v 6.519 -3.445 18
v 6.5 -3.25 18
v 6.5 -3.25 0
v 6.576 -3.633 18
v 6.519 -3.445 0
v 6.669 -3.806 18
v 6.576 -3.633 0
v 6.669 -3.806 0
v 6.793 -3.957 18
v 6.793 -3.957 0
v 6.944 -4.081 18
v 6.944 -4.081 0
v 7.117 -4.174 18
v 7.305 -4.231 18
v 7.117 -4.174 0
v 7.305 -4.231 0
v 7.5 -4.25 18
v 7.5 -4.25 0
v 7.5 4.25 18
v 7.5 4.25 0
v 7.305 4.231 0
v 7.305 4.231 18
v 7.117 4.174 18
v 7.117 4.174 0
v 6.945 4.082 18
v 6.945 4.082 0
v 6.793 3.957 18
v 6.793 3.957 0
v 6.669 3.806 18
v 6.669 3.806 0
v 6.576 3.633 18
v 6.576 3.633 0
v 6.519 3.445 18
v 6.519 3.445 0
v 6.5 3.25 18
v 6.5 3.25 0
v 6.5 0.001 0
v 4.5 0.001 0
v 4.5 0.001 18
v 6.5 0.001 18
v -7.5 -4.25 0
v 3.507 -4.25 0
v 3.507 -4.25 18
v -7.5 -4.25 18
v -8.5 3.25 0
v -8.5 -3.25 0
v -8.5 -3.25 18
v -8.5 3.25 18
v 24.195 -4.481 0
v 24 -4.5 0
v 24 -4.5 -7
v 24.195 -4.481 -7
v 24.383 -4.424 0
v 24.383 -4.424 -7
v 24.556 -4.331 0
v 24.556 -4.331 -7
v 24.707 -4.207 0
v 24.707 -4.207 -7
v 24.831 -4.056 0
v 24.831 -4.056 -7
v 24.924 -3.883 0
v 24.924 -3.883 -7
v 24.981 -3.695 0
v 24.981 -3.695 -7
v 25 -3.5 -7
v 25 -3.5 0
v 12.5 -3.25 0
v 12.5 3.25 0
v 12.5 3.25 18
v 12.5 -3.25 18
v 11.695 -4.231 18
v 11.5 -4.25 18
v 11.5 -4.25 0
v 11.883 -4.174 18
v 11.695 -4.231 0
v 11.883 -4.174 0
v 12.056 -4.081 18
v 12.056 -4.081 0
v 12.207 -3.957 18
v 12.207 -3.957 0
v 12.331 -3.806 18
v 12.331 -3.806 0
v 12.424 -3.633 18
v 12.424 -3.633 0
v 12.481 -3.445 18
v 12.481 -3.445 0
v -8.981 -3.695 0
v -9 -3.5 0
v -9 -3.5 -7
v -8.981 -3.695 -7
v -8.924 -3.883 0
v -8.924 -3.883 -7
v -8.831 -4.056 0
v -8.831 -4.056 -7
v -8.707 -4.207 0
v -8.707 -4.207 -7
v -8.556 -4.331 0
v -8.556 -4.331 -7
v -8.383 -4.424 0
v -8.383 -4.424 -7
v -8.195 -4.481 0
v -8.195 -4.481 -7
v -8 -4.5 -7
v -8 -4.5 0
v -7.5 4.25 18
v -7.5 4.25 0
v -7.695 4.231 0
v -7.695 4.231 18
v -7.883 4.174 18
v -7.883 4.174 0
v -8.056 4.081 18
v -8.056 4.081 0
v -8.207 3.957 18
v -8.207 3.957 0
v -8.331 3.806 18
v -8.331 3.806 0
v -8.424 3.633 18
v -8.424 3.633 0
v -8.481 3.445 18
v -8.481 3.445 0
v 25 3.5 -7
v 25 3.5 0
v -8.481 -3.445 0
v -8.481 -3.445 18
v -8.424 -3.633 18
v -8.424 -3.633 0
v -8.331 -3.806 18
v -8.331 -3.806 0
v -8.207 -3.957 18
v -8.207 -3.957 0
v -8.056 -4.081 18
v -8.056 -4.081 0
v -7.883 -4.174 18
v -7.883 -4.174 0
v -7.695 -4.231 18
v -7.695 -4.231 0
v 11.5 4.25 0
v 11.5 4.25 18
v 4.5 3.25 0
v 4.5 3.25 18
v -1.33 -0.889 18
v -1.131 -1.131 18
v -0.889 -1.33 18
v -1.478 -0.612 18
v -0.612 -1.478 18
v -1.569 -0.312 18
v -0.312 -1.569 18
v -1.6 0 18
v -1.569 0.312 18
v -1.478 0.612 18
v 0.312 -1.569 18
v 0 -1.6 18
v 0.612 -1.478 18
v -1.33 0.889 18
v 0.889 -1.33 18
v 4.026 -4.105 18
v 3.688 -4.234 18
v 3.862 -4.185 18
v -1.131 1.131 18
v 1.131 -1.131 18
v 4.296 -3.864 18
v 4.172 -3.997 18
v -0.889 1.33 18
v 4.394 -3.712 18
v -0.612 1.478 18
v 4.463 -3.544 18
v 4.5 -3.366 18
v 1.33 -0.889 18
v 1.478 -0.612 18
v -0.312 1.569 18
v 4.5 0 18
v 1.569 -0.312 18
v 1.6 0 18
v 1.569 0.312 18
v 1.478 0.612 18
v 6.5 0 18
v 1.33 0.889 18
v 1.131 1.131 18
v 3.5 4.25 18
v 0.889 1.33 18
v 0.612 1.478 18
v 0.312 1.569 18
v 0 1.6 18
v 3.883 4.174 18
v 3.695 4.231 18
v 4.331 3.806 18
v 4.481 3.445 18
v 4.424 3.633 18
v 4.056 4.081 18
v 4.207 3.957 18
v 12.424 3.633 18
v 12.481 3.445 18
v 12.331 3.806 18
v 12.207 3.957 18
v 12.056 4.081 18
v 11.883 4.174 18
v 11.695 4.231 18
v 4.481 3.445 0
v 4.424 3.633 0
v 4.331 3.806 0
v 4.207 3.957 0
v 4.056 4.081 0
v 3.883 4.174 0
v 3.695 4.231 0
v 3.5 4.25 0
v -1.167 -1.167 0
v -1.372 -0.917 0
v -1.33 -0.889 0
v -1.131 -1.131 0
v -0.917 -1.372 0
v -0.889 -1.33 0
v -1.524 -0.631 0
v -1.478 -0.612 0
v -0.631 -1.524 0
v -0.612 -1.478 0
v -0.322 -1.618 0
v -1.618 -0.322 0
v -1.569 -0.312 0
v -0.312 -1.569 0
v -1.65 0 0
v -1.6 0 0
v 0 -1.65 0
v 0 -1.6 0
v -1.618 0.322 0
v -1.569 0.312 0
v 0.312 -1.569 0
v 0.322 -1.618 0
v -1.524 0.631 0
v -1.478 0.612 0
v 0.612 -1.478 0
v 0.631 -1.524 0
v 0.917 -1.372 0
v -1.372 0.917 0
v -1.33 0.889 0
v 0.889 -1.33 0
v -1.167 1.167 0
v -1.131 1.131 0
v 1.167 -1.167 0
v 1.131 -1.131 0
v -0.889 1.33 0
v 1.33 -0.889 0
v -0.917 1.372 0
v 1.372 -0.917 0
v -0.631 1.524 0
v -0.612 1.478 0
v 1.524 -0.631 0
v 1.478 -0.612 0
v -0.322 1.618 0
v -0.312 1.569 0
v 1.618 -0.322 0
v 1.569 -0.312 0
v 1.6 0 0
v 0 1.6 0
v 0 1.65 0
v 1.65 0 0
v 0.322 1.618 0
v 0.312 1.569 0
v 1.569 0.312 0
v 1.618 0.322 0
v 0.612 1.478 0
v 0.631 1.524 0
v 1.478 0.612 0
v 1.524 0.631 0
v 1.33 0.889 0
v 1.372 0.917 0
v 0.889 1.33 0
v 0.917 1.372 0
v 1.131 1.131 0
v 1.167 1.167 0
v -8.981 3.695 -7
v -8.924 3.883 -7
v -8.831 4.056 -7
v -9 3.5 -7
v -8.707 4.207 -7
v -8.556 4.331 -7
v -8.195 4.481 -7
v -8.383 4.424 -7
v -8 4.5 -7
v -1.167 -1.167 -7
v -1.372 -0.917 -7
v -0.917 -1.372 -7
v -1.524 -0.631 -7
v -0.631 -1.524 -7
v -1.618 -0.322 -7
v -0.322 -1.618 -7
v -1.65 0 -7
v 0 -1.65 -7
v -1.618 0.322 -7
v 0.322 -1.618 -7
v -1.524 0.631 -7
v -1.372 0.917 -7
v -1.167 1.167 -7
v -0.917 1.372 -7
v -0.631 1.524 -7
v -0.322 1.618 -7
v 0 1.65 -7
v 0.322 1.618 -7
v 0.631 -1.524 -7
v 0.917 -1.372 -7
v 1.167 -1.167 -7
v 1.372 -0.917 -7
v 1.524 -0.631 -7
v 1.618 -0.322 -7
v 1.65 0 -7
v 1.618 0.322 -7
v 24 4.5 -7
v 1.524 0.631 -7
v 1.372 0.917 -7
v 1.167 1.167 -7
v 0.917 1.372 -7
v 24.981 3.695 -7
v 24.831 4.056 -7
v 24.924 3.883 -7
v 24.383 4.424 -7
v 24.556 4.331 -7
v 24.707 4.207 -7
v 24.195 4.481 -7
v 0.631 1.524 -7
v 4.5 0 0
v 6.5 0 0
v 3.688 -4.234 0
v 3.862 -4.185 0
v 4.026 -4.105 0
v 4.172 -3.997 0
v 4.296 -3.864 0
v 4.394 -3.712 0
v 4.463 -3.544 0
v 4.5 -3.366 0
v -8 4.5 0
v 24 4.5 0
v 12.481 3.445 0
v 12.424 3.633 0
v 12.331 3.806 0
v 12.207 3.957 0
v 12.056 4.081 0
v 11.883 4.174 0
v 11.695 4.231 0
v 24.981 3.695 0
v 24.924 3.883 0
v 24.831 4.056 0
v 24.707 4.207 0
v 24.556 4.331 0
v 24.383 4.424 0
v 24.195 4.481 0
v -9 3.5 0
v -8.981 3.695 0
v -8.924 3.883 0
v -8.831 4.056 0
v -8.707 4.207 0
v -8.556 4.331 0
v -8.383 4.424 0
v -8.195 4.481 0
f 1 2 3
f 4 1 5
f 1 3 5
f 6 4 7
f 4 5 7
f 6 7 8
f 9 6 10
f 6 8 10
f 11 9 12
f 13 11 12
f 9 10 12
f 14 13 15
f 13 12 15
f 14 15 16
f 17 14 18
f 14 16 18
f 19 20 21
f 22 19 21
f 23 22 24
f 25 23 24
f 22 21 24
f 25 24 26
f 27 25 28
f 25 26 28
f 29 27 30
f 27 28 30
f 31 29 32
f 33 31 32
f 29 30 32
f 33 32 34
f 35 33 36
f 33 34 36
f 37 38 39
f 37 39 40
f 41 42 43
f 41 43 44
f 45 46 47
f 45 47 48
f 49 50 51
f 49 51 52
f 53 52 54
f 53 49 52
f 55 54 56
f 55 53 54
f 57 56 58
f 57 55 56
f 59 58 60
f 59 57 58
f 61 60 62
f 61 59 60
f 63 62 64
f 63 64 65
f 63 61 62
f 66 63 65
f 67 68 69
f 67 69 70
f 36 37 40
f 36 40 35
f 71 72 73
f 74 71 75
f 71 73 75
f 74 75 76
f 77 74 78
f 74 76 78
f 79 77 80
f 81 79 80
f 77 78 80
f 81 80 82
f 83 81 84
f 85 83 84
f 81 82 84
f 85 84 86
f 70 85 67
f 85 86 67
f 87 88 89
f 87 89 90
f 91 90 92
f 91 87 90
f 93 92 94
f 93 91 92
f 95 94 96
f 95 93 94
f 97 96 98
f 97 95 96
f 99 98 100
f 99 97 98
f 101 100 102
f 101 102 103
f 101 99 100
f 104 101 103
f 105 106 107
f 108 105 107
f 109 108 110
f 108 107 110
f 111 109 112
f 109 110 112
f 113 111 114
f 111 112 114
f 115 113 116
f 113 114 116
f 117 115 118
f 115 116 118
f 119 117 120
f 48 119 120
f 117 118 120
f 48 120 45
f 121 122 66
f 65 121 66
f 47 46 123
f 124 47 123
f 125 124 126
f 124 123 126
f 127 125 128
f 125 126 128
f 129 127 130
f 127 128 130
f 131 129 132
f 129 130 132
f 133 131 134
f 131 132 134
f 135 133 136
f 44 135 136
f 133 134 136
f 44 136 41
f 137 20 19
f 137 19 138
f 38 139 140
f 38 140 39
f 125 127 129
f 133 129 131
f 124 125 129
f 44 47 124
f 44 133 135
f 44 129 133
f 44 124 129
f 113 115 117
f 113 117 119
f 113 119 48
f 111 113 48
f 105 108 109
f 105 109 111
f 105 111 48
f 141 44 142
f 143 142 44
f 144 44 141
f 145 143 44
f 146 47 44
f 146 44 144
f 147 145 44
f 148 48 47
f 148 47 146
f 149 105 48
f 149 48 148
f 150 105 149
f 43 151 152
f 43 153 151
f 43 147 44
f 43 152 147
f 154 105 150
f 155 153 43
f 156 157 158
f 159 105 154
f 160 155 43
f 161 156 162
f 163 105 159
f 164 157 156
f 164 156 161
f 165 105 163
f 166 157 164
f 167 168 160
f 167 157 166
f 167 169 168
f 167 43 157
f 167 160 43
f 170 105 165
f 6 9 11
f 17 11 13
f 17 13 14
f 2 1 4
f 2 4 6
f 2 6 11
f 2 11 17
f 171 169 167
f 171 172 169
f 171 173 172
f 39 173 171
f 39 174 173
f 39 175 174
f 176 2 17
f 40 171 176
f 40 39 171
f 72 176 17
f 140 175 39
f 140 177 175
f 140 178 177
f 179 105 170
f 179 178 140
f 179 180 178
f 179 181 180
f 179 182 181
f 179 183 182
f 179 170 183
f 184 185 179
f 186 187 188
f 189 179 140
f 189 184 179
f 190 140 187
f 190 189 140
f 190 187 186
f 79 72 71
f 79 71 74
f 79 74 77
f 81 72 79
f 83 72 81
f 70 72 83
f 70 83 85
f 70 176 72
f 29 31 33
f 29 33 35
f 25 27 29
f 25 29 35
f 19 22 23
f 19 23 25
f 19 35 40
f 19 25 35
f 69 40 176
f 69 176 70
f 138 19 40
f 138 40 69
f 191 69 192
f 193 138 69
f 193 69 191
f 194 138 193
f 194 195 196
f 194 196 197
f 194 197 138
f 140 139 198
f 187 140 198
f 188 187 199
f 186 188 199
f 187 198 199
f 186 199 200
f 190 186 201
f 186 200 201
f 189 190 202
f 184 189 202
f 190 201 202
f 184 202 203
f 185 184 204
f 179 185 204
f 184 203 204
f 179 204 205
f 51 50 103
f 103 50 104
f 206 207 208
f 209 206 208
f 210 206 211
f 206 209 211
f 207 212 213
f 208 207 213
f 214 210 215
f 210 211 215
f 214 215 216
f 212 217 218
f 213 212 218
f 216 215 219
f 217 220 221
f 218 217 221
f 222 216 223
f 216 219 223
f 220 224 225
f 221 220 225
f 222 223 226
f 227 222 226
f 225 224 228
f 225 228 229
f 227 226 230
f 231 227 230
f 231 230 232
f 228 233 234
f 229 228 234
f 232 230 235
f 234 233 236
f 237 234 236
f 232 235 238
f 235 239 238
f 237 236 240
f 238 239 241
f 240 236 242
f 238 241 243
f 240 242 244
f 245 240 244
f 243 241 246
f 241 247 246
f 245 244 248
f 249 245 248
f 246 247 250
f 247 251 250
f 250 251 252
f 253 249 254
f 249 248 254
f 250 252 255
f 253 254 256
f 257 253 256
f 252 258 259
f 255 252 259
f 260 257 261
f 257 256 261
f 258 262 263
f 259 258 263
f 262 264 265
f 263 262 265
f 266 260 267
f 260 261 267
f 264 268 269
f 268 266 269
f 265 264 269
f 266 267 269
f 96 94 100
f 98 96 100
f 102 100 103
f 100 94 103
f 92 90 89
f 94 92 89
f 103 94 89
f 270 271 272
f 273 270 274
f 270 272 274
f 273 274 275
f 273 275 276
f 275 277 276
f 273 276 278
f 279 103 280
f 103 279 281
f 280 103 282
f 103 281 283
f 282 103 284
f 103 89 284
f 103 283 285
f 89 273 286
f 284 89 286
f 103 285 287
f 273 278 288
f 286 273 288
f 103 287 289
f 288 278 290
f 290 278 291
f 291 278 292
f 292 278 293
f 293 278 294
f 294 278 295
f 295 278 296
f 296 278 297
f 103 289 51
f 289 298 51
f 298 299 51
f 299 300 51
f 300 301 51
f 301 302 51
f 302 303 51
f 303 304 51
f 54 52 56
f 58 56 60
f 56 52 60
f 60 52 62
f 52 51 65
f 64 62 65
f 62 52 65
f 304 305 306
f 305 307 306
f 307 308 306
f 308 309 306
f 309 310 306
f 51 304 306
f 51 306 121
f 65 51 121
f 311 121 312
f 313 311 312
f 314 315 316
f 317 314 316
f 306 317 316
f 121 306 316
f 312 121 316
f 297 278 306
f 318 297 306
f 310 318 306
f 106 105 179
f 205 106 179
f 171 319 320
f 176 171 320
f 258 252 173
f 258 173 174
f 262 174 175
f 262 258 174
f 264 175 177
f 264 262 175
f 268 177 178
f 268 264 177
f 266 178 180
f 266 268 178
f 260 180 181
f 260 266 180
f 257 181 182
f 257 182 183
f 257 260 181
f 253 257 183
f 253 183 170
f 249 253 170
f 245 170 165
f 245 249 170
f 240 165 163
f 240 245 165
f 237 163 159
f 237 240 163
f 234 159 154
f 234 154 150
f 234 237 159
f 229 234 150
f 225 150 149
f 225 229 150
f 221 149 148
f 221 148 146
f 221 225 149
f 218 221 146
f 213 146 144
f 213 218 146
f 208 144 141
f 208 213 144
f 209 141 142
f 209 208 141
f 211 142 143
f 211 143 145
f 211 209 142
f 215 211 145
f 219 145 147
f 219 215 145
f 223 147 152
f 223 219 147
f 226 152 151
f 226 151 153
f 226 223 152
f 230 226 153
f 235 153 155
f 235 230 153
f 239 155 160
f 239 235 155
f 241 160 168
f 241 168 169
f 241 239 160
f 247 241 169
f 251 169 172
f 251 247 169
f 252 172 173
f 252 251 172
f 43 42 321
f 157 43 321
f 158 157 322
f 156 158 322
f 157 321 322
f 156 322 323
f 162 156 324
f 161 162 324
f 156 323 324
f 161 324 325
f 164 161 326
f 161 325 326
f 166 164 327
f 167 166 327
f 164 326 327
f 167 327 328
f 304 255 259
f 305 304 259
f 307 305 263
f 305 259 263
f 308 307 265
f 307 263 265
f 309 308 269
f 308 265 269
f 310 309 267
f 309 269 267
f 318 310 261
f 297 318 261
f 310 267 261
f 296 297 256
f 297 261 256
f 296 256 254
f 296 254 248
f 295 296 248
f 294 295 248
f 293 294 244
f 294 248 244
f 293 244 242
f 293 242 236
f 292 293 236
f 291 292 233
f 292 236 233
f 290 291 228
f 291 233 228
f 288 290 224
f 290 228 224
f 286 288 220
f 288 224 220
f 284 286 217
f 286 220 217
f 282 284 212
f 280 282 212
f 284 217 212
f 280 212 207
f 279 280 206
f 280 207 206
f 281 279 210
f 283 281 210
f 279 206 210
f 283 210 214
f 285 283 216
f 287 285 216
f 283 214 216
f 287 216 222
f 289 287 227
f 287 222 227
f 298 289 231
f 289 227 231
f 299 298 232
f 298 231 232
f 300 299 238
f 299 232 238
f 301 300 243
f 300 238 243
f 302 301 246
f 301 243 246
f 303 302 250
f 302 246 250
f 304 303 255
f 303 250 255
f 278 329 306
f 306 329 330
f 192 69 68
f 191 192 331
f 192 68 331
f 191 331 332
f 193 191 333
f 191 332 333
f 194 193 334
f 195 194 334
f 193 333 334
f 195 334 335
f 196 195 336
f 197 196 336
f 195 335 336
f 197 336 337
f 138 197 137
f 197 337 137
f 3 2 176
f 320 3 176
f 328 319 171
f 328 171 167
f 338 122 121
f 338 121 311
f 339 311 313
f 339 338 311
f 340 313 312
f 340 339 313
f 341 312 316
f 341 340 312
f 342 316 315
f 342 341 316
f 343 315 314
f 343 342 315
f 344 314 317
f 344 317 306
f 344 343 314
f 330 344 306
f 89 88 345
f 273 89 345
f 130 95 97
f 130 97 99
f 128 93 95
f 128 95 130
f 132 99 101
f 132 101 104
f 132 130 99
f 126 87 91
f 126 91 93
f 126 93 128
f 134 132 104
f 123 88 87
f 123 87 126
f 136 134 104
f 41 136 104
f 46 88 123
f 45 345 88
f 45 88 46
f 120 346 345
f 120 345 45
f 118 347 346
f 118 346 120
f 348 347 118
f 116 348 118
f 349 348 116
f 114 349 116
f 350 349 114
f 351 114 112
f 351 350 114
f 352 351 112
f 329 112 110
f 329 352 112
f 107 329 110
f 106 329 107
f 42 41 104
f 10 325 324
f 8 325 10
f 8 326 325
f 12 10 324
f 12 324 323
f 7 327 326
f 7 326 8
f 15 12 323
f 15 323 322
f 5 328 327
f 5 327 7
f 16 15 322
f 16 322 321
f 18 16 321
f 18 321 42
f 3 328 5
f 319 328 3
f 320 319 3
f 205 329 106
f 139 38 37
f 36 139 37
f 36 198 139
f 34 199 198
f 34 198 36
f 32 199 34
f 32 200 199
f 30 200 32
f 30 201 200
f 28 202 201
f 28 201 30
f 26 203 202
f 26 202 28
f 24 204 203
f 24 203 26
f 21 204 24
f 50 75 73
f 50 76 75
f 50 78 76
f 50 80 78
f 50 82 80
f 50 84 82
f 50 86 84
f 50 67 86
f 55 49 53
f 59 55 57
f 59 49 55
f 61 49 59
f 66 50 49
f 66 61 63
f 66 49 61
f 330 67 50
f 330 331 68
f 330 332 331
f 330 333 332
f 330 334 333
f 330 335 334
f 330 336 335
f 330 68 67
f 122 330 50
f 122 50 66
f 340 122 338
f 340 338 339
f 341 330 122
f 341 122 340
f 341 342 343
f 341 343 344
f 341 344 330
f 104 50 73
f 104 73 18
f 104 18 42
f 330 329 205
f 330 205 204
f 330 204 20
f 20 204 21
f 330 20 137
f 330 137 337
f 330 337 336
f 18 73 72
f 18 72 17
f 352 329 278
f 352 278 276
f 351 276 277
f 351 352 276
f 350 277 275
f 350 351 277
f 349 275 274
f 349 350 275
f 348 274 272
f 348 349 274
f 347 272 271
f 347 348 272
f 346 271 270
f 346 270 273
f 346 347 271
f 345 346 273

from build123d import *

# Parameters (mm, degrees)
SKETCH_R     = 1.6
PAD_DEPTH    = 18
SKETCH001_R  = 1.65
PAD001_DEPTH = 7


with BuildPart() as part:
    # Sketch → Pad (new body)
    with BuildSketch(Plane.XY):
        with BuildLine():
            ThreePointArc((-7.5, 4.25), (-8.207107, 3.957107), (-8.5, 3.25))
            Line((-8.5, -3.25), (-8.5, 3.25))
            ThreePointArc((-8.5, -3.25), (-8.207107, -3.957107), (-7.5, -4.25))
            Line((3.506737, -4.25), (-7.5, -4.25))
            ThreePointArc((3.506737, -4.25), (4.171612, -3.996955), (4.5, -3.365883))
            Line((4.5, 0), (4.5, -3.365883))
            Line((4.5, 0), (6.5, 0))
            Line((6.5, -3.25), (6.5, 0))
            ThreePointArc((6.5, -3.25), (6.792893, -3.957107), (7.5, -4.25))
            Line((11.5, -4.25), (7.5, -4.25))
            ThreePointArc((11.5, -4.25), (12.207107, -3.957107), (12.5, -3.25))
            Line((12.5, 3.25), (12.5, -3.25))
            ThreePointArc((12.5, 3.25), (12.207107, 3.957107), (11.5, 4.25))
            Line((7.5, 4.25), (11.5, 4.25))
            ThreePointArc((7.5, 4.25), (6.793016, 3.957229), (6.5, 3.250346))
            Line((6.5, 0.001), (6.5, 3.250346))
            Line((4.5, 0.001), (6.5, 0.001))
            Line((4.5, 3.25), (4.5, 0.001))
            ThreePointArc((4.5, 3.25), (4.207107, 3.957107), (3.5, 4.25))
            Line((-7.5, 4.25), (3.5, 4.25))
        make_face()
        Circle(SKETCH_R, mode=Mode.SUBTRACT)
    extrude(amount=PAD_DEPTH)

    # Sketch001 → Pad001 (join)
    with BuildSketch(Plane.XY):
        with BuildLine():
            ThreePointArc((-8, 4.5), (-8.707107, 4.207107), (-9, 3.5))
            Line((-9, -3.5), (-9, 3.5))
            ThreePointArc((-9, -3.5), (-8.707107, -4.207107), (-8, -4.5))
            Line((24, -4.5), (-8, -4.5))
            ThreePointArc((24, -4.5), (24.707107, -4.207107), (25, -3.5))
            Line((25, 3.5), (25, -3.5))
            ThreePointArc((25, 3.5), (24.707107, 4.207107), (24, 4.5))
            Line((-8, 4.5), (24, 4.5))
        make_face()
        Circle(SKETCH001_R, mode=Mode.SUBTRACT)
    extrude(amount=-PAD001_DEPTH)


solid = part.part
